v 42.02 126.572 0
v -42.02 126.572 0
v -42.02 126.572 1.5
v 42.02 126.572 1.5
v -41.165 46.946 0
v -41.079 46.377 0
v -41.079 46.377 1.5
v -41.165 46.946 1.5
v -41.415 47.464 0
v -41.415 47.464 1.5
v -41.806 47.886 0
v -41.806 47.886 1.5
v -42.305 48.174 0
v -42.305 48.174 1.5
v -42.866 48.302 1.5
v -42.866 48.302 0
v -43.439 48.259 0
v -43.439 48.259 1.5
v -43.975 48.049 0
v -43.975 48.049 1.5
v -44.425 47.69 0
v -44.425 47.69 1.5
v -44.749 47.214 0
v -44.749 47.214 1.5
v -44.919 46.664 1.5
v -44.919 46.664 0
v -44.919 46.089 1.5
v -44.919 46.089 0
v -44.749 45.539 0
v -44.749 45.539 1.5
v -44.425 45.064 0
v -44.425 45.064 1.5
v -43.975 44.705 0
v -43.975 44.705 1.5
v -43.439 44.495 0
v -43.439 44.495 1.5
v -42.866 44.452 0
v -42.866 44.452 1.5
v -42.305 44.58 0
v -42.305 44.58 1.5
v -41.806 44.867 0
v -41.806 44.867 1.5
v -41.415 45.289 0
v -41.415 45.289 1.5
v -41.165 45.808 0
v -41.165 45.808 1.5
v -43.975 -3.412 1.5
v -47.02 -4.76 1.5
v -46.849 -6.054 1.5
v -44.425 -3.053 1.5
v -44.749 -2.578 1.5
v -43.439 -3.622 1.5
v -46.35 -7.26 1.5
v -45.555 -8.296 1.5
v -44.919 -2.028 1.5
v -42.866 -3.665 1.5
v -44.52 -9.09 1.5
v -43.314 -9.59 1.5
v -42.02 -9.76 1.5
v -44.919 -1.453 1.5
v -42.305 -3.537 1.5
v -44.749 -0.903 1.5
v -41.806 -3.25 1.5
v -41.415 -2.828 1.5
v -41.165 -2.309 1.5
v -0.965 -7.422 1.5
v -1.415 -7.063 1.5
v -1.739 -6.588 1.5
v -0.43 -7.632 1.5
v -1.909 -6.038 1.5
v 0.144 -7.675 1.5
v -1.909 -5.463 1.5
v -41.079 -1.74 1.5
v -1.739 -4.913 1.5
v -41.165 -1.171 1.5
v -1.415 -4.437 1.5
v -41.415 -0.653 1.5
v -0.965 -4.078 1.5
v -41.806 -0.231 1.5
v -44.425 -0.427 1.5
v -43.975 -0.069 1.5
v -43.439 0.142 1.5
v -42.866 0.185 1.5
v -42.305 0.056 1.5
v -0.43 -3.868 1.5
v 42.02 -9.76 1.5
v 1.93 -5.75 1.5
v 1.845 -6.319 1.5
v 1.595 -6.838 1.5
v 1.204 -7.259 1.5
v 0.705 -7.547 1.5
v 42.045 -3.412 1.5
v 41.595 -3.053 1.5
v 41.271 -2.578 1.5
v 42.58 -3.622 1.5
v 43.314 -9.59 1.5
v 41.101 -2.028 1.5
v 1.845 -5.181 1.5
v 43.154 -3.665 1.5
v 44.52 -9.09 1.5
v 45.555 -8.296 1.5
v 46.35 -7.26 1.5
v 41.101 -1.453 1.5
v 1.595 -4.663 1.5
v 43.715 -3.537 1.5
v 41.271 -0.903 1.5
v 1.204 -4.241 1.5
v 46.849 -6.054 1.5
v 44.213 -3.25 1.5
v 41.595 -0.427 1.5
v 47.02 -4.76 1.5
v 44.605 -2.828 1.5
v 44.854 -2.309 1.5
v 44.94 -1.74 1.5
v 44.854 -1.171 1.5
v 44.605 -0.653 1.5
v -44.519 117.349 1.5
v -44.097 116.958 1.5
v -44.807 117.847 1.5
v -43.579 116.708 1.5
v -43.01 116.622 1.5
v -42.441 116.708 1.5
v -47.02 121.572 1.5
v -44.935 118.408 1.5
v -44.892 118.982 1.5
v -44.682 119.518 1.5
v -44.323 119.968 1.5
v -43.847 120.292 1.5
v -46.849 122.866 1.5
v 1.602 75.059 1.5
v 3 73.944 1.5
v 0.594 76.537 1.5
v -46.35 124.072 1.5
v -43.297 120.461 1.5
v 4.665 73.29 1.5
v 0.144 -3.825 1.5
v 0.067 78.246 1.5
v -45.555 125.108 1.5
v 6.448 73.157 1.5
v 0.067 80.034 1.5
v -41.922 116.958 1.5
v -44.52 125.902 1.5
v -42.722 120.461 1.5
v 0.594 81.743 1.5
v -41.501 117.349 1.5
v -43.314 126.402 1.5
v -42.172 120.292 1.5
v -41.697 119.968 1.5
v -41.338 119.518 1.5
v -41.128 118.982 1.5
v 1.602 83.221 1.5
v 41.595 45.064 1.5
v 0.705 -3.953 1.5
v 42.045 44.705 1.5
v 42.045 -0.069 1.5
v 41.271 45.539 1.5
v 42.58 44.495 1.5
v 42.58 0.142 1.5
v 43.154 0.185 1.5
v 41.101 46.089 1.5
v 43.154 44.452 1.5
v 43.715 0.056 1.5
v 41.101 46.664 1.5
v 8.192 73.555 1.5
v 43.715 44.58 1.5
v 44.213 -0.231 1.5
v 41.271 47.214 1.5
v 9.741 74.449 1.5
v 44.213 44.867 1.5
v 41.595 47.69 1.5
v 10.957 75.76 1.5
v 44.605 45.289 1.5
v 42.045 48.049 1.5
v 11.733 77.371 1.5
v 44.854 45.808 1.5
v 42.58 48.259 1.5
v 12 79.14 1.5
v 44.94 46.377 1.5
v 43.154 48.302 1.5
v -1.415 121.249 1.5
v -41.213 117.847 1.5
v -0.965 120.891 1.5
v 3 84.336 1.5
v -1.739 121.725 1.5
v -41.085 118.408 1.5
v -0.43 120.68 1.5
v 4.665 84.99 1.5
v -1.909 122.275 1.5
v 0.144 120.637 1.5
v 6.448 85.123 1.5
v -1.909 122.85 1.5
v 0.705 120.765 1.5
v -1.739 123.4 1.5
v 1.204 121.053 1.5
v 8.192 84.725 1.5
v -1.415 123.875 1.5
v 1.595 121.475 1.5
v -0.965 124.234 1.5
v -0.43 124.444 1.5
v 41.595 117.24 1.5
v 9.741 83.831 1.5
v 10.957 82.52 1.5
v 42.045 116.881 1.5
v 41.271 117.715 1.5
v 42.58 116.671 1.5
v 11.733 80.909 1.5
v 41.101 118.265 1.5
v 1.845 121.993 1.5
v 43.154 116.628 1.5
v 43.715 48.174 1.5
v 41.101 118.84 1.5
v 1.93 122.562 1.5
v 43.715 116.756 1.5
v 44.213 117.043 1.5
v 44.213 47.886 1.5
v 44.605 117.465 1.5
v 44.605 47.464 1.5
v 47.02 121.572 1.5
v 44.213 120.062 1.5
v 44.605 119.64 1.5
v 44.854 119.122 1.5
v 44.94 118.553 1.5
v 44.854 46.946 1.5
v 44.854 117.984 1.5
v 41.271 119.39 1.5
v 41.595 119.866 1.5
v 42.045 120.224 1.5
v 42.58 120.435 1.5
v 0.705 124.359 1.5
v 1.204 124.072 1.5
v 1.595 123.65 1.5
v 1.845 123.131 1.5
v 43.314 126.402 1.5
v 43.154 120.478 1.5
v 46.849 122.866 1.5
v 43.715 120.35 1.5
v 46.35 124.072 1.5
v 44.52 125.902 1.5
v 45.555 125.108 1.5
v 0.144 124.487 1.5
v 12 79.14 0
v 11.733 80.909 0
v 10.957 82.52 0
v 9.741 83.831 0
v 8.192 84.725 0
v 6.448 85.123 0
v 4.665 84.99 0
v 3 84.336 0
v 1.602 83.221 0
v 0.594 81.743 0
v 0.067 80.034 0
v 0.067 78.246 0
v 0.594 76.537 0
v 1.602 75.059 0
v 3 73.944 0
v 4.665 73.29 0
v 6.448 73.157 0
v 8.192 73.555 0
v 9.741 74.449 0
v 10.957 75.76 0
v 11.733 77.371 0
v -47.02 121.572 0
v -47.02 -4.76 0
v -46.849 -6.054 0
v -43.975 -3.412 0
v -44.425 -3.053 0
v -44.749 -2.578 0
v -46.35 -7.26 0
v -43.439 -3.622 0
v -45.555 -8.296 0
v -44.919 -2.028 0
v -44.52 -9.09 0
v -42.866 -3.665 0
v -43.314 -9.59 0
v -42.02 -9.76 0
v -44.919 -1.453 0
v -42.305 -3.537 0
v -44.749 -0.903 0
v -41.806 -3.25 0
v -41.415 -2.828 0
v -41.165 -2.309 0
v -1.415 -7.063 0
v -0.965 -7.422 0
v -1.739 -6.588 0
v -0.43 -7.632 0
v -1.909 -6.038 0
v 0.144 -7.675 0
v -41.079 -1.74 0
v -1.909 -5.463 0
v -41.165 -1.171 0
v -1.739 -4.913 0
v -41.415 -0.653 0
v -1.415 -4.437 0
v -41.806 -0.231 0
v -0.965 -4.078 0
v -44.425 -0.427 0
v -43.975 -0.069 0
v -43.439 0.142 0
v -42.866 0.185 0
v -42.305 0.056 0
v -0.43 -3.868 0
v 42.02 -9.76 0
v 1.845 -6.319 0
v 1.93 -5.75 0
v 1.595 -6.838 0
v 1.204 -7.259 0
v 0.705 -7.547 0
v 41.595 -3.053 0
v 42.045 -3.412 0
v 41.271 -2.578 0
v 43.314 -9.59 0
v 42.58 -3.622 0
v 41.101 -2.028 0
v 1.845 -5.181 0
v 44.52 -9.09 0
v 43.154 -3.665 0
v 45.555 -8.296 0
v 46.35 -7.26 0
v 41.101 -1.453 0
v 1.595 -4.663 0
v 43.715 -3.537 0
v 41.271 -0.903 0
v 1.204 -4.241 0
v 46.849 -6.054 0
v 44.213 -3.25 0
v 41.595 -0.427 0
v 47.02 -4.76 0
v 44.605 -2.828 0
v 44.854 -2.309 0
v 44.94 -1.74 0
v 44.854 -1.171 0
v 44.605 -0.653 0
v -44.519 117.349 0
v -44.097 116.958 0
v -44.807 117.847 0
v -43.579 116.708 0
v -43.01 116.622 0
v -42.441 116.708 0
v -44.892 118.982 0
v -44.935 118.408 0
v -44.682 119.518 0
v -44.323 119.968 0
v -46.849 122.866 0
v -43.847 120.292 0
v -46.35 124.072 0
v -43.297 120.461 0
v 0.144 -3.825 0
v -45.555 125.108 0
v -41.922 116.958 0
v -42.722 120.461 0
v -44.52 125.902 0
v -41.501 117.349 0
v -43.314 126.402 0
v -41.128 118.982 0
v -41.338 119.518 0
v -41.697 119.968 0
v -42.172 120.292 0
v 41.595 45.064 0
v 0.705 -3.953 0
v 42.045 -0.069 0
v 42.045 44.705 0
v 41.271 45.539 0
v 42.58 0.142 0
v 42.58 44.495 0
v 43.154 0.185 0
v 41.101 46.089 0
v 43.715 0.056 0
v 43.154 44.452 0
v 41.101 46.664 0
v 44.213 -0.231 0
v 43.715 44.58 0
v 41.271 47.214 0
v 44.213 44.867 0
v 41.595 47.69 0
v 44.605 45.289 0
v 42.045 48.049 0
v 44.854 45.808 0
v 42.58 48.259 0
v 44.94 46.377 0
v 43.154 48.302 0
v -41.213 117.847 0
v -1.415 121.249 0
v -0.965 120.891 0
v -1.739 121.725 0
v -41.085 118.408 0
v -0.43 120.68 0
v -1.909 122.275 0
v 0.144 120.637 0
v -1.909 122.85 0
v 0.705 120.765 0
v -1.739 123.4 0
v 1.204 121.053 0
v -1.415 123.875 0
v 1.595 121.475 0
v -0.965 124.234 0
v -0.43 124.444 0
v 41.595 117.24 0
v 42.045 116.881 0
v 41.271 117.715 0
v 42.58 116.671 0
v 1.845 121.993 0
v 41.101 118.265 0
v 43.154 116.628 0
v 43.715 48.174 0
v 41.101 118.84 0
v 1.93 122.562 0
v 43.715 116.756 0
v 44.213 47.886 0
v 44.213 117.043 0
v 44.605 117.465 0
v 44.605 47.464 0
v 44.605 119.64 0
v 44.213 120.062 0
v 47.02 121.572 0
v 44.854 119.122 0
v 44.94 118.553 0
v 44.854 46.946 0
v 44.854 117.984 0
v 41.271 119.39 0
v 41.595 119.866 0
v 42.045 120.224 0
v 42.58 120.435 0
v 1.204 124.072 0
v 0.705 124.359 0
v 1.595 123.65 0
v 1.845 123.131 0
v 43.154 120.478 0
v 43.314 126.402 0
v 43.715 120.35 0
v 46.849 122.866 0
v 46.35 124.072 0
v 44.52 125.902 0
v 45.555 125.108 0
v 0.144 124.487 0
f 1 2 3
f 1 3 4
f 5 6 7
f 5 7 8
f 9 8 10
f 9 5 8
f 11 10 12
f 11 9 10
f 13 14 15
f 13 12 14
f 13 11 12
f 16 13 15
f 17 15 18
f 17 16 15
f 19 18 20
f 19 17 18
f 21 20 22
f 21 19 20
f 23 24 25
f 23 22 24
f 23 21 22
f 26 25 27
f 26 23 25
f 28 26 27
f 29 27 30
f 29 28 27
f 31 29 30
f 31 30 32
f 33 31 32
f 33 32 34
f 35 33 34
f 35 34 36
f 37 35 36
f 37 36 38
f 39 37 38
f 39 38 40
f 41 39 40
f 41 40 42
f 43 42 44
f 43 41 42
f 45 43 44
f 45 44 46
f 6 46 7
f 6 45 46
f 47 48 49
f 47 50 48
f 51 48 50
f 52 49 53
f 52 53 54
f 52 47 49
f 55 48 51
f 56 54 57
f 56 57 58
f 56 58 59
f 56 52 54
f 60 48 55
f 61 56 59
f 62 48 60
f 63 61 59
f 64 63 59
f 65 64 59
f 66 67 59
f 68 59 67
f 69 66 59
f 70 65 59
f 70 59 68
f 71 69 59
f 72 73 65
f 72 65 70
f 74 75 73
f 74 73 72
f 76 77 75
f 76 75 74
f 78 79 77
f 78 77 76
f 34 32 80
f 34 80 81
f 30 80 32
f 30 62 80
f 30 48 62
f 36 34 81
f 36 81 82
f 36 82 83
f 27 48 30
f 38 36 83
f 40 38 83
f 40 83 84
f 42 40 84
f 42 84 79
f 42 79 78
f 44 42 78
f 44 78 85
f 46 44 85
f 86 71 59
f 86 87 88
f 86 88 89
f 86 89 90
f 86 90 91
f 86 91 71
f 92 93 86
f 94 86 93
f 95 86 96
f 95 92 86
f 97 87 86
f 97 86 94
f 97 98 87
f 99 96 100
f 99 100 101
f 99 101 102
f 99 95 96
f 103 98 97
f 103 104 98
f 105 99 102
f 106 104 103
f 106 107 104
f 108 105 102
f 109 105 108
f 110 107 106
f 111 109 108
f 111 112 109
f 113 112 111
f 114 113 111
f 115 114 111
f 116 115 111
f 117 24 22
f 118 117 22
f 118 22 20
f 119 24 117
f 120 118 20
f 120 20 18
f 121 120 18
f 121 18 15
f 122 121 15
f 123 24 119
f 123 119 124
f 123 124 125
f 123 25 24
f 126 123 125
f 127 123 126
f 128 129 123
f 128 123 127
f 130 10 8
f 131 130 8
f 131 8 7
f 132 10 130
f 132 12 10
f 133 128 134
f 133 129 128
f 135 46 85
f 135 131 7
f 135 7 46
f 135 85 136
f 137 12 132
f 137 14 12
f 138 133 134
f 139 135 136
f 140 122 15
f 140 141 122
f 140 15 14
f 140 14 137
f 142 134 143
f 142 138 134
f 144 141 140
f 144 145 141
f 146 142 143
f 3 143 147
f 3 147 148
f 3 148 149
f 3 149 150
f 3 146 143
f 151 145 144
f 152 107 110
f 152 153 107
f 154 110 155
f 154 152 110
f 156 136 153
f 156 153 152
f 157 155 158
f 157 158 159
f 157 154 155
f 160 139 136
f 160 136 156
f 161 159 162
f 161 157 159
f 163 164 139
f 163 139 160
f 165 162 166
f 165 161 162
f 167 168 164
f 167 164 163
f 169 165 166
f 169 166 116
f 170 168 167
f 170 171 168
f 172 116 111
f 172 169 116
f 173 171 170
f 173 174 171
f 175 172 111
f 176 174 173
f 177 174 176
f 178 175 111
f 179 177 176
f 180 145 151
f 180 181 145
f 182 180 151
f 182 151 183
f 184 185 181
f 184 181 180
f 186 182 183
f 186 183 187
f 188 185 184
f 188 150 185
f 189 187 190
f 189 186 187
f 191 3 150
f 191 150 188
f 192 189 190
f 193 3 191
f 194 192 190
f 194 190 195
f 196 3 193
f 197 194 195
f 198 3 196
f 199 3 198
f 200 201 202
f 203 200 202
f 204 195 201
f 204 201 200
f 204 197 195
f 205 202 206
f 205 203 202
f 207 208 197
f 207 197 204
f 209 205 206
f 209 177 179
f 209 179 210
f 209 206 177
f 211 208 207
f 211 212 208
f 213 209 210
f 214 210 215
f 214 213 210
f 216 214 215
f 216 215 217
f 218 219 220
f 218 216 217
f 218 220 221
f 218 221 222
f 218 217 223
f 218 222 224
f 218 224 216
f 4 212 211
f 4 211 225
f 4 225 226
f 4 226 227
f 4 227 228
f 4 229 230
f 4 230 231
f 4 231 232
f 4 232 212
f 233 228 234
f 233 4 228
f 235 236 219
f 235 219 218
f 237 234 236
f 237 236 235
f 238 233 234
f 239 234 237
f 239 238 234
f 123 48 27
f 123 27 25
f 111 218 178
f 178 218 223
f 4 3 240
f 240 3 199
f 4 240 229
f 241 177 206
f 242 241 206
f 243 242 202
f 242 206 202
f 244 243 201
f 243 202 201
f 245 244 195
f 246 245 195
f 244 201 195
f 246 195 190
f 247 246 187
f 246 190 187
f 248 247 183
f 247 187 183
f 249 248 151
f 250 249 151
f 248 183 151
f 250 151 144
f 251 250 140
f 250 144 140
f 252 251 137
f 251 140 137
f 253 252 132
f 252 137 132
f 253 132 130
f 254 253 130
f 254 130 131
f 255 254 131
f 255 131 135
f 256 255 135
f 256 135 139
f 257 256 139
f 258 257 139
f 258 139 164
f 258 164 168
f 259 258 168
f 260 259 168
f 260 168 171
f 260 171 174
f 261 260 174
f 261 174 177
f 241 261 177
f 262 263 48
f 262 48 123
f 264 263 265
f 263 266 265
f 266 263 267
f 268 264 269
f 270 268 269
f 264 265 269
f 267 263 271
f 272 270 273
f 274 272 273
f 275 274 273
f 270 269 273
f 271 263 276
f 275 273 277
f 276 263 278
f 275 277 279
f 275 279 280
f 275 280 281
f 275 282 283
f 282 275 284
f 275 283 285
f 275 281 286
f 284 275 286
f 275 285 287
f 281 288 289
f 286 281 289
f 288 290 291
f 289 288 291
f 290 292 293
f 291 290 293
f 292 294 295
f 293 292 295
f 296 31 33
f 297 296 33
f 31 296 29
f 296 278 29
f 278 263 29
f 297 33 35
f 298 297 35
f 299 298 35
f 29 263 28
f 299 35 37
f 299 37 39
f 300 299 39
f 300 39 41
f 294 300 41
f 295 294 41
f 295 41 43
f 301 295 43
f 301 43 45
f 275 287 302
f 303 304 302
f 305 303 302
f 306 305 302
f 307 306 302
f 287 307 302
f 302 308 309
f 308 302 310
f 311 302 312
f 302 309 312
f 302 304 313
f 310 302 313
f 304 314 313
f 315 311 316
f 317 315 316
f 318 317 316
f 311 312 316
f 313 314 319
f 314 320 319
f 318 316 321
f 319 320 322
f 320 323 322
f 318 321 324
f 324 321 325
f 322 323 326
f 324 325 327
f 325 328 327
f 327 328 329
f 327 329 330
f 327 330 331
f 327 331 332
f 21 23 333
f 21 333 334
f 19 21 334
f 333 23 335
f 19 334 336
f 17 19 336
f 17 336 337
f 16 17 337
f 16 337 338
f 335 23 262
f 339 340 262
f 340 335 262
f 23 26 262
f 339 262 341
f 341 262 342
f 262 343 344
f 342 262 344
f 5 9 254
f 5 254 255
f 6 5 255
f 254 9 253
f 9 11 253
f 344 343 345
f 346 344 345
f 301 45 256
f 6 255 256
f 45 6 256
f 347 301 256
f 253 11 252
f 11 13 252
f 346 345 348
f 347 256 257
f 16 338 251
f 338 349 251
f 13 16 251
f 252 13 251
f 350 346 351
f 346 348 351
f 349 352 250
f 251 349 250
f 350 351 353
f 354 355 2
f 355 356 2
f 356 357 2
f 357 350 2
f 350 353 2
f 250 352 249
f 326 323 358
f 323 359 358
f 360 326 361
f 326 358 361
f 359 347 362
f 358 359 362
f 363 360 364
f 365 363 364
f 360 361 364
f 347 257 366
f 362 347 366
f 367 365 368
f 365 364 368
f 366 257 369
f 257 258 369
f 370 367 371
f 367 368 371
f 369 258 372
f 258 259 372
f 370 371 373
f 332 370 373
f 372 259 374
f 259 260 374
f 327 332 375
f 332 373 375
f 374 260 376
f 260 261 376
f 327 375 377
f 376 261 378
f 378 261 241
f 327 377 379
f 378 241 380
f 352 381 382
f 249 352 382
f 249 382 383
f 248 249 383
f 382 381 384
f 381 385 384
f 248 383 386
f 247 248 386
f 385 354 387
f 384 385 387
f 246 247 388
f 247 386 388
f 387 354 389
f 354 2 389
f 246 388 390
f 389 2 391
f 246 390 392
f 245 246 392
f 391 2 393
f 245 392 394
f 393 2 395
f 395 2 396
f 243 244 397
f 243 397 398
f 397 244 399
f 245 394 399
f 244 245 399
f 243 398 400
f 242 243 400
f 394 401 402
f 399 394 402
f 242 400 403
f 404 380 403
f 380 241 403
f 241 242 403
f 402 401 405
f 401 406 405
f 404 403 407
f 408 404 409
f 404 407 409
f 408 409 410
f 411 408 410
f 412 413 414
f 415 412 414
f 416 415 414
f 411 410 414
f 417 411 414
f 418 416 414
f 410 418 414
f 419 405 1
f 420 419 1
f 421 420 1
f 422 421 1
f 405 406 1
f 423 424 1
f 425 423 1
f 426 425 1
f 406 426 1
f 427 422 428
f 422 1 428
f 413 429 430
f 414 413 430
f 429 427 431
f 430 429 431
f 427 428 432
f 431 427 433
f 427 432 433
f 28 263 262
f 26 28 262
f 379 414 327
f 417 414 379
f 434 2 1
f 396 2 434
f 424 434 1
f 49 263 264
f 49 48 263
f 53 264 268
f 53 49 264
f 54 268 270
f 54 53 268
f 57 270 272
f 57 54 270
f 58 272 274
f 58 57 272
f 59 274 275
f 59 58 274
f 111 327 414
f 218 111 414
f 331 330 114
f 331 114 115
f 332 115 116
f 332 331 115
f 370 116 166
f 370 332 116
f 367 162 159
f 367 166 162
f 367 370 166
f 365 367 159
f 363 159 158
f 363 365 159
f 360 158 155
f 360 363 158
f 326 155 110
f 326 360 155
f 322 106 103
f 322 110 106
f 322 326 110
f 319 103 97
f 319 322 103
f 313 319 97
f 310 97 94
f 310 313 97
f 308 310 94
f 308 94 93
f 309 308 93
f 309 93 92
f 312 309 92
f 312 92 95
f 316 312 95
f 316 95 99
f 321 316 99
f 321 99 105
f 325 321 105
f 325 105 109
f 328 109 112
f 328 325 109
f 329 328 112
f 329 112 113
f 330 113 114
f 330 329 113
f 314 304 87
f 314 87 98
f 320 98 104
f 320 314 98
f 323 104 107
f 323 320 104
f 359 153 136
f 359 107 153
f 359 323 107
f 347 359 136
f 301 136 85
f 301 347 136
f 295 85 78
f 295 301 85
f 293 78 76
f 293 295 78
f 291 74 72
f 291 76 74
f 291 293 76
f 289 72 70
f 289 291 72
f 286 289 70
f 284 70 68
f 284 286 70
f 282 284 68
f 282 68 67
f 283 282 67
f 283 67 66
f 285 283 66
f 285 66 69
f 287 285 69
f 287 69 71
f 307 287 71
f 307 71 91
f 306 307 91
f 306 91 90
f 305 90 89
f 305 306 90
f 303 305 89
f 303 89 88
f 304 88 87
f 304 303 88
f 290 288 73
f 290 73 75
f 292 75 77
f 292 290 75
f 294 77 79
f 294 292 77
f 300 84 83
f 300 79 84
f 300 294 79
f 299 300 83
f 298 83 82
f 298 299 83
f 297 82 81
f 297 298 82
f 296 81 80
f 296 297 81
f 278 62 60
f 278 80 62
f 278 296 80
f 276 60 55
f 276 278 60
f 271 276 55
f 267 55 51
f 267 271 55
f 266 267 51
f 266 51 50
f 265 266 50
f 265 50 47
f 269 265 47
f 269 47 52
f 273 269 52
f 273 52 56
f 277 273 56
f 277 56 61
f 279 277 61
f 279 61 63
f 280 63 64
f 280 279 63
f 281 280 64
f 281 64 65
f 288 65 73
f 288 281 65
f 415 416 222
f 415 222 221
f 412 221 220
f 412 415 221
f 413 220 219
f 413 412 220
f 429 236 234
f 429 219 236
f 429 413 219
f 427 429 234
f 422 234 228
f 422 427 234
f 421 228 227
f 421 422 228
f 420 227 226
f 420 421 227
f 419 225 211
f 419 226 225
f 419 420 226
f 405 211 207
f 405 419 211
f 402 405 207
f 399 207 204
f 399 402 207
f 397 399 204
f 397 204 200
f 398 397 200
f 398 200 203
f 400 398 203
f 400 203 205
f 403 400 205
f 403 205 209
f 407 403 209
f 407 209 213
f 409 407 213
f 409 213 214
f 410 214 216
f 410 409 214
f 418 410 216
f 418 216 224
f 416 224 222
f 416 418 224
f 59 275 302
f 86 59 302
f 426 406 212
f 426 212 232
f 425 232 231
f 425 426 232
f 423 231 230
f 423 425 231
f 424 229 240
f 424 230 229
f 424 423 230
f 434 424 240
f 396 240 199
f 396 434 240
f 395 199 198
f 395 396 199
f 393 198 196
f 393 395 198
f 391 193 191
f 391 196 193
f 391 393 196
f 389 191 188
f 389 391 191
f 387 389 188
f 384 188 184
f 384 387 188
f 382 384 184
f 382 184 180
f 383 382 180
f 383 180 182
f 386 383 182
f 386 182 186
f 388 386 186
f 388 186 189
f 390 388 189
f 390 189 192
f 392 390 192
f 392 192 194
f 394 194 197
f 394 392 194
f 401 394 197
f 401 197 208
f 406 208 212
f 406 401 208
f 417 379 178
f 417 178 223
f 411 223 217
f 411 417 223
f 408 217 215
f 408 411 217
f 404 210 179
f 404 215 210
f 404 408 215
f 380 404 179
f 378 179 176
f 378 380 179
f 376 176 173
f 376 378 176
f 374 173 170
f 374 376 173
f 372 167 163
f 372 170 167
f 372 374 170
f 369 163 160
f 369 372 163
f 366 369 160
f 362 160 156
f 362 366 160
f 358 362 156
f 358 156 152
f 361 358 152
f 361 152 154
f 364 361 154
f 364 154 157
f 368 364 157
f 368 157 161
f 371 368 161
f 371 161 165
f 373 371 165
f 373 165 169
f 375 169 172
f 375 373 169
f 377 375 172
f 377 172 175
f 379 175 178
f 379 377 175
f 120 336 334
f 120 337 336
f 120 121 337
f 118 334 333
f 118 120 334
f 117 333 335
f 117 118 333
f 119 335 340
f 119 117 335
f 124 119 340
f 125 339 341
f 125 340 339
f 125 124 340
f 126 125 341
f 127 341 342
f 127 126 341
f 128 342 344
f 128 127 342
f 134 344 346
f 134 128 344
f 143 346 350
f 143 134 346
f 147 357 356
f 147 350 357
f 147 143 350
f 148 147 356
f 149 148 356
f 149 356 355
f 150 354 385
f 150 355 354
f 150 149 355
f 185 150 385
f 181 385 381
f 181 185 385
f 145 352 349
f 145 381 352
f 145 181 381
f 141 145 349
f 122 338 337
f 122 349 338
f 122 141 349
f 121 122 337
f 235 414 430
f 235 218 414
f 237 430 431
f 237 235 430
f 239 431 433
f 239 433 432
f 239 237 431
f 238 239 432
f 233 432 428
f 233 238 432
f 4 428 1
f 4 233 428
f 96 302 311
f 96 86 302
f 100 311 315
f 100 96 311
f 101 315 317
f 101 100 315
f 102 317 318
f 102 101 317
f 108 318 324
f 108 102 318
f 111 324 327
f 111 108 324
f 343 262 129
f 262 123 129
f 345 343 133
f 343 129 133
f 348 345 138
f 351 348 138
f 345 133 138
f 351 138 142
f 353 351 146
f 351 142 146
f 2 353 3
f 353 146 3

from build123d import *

# Parameters (mm, degrees)
SKETCH1_W                 = 94.03907037
SKETCH1_H                 = 136.332098139
BOSS_EXTRUDE1_DEPTH       = 1.5
FILLET1_R                 = 5
SKETCH_PATTERN1_START     = -1
SKETCH_PATTERN1_OUTLINE_R = 1.9304
SKETCH_PATTERN1_DEPTH     = 3
SKETCH4_R                 = 6
CUT_EXTRUDE2_DEPTH        = 136.031781017


with BuildPart() as part:
    # Sketch1 → Boss-Extrude1 (new body)
    with BuildSketch(Plane.XY):
        with Locations((0, 58.406045784)):
            Rectangle(SKETCH1_W, SKETCH1_H)
    extrude(amount=BOSS_EXTRUDE1_DEPTH)

    # Fillet1
    fillet1_edges = [part.edges().sort_by_distance(p)[0] for p in [
        (47.019535185, -9.760003286, 0.75),
        (-47.019535185, -9.760003286, 0.75),
        (-47.019535185, 126.572094853, 0.75),
        (47.019535185, 126.572094853, 0.75),
    ]]
    fillet(fillet1_edges, radius=FILLET1_R)

    # Sketch3 → #24 (0.152) Diameter Hole1 (revolve, cut)
    with BuildSketch(Plane(origin=(-43.009767592, 118.552559669, 1.5), x_dir=(0, -1, 0), z_dir=(1, 0, 0))):
        Polygon((0, 0), (0, 13.859901339), (1.9304, 12.7), (1.9304, 0), align=None)
    revolve(axis=Axis((-43.009767592, 118.552559669, 7.85), (0, 0, -1)), mode=Mode.SUBTRACT)

    # Sketch-Pattern1: read off the stored shape, not the designer's step
    # Sketch-Pattern1 outline → Sketch-Pattern1 (cut)
    with BuildSketch(Plane.XY.offset(SKETCH_PATTERN1_START)):
        with Locations((0, -5.750235693)):
            Circle(SKETCH_PATTERN1_OUTLINE_R)
        with Locations((0, 122.562327261)):
            Circle(SKETCH_PATTERN1_OUTLINE_R)
        with Locations((-43.009767592, -1.740468101)):
            Circle(SKETCH_PATTERN1_OUTLINE_R)
        with Locations((-43.009767592, 46.376743007)):
            Circle(SKETCH_PATTERN1_OUTLINE_R)
        with Locations((43.009767592, -1.740468101)):
            Circle(SKETCH_PATTERN1_OUTLINE_R)
        with Locations((43.009767592, 46.376743007)):
            Circle(SKETCH_PATTERN1_OUTLINE_R)
        with Locations((43.009767592, 118.552559669)):
            Circle(SKETCH_PATTERN1_OUTLINE_R)
    extrude(amount=SKETCH_PATTERN1_DEPTH, mode=Mode.SUBTRACT)

    # Sketch4 → Cut-Extrude2 (cut, through all)
    with BuildSketch(Plane.XY.offset(1.5)):
        with Locations((6.000018773, 79.140018508)):
            Circle(SKETCH4_R)
    extrude(amount=-CUT_EXTRUDE2_DEPTH, mode=Mode.SUBTRACT)


solid = part.part
